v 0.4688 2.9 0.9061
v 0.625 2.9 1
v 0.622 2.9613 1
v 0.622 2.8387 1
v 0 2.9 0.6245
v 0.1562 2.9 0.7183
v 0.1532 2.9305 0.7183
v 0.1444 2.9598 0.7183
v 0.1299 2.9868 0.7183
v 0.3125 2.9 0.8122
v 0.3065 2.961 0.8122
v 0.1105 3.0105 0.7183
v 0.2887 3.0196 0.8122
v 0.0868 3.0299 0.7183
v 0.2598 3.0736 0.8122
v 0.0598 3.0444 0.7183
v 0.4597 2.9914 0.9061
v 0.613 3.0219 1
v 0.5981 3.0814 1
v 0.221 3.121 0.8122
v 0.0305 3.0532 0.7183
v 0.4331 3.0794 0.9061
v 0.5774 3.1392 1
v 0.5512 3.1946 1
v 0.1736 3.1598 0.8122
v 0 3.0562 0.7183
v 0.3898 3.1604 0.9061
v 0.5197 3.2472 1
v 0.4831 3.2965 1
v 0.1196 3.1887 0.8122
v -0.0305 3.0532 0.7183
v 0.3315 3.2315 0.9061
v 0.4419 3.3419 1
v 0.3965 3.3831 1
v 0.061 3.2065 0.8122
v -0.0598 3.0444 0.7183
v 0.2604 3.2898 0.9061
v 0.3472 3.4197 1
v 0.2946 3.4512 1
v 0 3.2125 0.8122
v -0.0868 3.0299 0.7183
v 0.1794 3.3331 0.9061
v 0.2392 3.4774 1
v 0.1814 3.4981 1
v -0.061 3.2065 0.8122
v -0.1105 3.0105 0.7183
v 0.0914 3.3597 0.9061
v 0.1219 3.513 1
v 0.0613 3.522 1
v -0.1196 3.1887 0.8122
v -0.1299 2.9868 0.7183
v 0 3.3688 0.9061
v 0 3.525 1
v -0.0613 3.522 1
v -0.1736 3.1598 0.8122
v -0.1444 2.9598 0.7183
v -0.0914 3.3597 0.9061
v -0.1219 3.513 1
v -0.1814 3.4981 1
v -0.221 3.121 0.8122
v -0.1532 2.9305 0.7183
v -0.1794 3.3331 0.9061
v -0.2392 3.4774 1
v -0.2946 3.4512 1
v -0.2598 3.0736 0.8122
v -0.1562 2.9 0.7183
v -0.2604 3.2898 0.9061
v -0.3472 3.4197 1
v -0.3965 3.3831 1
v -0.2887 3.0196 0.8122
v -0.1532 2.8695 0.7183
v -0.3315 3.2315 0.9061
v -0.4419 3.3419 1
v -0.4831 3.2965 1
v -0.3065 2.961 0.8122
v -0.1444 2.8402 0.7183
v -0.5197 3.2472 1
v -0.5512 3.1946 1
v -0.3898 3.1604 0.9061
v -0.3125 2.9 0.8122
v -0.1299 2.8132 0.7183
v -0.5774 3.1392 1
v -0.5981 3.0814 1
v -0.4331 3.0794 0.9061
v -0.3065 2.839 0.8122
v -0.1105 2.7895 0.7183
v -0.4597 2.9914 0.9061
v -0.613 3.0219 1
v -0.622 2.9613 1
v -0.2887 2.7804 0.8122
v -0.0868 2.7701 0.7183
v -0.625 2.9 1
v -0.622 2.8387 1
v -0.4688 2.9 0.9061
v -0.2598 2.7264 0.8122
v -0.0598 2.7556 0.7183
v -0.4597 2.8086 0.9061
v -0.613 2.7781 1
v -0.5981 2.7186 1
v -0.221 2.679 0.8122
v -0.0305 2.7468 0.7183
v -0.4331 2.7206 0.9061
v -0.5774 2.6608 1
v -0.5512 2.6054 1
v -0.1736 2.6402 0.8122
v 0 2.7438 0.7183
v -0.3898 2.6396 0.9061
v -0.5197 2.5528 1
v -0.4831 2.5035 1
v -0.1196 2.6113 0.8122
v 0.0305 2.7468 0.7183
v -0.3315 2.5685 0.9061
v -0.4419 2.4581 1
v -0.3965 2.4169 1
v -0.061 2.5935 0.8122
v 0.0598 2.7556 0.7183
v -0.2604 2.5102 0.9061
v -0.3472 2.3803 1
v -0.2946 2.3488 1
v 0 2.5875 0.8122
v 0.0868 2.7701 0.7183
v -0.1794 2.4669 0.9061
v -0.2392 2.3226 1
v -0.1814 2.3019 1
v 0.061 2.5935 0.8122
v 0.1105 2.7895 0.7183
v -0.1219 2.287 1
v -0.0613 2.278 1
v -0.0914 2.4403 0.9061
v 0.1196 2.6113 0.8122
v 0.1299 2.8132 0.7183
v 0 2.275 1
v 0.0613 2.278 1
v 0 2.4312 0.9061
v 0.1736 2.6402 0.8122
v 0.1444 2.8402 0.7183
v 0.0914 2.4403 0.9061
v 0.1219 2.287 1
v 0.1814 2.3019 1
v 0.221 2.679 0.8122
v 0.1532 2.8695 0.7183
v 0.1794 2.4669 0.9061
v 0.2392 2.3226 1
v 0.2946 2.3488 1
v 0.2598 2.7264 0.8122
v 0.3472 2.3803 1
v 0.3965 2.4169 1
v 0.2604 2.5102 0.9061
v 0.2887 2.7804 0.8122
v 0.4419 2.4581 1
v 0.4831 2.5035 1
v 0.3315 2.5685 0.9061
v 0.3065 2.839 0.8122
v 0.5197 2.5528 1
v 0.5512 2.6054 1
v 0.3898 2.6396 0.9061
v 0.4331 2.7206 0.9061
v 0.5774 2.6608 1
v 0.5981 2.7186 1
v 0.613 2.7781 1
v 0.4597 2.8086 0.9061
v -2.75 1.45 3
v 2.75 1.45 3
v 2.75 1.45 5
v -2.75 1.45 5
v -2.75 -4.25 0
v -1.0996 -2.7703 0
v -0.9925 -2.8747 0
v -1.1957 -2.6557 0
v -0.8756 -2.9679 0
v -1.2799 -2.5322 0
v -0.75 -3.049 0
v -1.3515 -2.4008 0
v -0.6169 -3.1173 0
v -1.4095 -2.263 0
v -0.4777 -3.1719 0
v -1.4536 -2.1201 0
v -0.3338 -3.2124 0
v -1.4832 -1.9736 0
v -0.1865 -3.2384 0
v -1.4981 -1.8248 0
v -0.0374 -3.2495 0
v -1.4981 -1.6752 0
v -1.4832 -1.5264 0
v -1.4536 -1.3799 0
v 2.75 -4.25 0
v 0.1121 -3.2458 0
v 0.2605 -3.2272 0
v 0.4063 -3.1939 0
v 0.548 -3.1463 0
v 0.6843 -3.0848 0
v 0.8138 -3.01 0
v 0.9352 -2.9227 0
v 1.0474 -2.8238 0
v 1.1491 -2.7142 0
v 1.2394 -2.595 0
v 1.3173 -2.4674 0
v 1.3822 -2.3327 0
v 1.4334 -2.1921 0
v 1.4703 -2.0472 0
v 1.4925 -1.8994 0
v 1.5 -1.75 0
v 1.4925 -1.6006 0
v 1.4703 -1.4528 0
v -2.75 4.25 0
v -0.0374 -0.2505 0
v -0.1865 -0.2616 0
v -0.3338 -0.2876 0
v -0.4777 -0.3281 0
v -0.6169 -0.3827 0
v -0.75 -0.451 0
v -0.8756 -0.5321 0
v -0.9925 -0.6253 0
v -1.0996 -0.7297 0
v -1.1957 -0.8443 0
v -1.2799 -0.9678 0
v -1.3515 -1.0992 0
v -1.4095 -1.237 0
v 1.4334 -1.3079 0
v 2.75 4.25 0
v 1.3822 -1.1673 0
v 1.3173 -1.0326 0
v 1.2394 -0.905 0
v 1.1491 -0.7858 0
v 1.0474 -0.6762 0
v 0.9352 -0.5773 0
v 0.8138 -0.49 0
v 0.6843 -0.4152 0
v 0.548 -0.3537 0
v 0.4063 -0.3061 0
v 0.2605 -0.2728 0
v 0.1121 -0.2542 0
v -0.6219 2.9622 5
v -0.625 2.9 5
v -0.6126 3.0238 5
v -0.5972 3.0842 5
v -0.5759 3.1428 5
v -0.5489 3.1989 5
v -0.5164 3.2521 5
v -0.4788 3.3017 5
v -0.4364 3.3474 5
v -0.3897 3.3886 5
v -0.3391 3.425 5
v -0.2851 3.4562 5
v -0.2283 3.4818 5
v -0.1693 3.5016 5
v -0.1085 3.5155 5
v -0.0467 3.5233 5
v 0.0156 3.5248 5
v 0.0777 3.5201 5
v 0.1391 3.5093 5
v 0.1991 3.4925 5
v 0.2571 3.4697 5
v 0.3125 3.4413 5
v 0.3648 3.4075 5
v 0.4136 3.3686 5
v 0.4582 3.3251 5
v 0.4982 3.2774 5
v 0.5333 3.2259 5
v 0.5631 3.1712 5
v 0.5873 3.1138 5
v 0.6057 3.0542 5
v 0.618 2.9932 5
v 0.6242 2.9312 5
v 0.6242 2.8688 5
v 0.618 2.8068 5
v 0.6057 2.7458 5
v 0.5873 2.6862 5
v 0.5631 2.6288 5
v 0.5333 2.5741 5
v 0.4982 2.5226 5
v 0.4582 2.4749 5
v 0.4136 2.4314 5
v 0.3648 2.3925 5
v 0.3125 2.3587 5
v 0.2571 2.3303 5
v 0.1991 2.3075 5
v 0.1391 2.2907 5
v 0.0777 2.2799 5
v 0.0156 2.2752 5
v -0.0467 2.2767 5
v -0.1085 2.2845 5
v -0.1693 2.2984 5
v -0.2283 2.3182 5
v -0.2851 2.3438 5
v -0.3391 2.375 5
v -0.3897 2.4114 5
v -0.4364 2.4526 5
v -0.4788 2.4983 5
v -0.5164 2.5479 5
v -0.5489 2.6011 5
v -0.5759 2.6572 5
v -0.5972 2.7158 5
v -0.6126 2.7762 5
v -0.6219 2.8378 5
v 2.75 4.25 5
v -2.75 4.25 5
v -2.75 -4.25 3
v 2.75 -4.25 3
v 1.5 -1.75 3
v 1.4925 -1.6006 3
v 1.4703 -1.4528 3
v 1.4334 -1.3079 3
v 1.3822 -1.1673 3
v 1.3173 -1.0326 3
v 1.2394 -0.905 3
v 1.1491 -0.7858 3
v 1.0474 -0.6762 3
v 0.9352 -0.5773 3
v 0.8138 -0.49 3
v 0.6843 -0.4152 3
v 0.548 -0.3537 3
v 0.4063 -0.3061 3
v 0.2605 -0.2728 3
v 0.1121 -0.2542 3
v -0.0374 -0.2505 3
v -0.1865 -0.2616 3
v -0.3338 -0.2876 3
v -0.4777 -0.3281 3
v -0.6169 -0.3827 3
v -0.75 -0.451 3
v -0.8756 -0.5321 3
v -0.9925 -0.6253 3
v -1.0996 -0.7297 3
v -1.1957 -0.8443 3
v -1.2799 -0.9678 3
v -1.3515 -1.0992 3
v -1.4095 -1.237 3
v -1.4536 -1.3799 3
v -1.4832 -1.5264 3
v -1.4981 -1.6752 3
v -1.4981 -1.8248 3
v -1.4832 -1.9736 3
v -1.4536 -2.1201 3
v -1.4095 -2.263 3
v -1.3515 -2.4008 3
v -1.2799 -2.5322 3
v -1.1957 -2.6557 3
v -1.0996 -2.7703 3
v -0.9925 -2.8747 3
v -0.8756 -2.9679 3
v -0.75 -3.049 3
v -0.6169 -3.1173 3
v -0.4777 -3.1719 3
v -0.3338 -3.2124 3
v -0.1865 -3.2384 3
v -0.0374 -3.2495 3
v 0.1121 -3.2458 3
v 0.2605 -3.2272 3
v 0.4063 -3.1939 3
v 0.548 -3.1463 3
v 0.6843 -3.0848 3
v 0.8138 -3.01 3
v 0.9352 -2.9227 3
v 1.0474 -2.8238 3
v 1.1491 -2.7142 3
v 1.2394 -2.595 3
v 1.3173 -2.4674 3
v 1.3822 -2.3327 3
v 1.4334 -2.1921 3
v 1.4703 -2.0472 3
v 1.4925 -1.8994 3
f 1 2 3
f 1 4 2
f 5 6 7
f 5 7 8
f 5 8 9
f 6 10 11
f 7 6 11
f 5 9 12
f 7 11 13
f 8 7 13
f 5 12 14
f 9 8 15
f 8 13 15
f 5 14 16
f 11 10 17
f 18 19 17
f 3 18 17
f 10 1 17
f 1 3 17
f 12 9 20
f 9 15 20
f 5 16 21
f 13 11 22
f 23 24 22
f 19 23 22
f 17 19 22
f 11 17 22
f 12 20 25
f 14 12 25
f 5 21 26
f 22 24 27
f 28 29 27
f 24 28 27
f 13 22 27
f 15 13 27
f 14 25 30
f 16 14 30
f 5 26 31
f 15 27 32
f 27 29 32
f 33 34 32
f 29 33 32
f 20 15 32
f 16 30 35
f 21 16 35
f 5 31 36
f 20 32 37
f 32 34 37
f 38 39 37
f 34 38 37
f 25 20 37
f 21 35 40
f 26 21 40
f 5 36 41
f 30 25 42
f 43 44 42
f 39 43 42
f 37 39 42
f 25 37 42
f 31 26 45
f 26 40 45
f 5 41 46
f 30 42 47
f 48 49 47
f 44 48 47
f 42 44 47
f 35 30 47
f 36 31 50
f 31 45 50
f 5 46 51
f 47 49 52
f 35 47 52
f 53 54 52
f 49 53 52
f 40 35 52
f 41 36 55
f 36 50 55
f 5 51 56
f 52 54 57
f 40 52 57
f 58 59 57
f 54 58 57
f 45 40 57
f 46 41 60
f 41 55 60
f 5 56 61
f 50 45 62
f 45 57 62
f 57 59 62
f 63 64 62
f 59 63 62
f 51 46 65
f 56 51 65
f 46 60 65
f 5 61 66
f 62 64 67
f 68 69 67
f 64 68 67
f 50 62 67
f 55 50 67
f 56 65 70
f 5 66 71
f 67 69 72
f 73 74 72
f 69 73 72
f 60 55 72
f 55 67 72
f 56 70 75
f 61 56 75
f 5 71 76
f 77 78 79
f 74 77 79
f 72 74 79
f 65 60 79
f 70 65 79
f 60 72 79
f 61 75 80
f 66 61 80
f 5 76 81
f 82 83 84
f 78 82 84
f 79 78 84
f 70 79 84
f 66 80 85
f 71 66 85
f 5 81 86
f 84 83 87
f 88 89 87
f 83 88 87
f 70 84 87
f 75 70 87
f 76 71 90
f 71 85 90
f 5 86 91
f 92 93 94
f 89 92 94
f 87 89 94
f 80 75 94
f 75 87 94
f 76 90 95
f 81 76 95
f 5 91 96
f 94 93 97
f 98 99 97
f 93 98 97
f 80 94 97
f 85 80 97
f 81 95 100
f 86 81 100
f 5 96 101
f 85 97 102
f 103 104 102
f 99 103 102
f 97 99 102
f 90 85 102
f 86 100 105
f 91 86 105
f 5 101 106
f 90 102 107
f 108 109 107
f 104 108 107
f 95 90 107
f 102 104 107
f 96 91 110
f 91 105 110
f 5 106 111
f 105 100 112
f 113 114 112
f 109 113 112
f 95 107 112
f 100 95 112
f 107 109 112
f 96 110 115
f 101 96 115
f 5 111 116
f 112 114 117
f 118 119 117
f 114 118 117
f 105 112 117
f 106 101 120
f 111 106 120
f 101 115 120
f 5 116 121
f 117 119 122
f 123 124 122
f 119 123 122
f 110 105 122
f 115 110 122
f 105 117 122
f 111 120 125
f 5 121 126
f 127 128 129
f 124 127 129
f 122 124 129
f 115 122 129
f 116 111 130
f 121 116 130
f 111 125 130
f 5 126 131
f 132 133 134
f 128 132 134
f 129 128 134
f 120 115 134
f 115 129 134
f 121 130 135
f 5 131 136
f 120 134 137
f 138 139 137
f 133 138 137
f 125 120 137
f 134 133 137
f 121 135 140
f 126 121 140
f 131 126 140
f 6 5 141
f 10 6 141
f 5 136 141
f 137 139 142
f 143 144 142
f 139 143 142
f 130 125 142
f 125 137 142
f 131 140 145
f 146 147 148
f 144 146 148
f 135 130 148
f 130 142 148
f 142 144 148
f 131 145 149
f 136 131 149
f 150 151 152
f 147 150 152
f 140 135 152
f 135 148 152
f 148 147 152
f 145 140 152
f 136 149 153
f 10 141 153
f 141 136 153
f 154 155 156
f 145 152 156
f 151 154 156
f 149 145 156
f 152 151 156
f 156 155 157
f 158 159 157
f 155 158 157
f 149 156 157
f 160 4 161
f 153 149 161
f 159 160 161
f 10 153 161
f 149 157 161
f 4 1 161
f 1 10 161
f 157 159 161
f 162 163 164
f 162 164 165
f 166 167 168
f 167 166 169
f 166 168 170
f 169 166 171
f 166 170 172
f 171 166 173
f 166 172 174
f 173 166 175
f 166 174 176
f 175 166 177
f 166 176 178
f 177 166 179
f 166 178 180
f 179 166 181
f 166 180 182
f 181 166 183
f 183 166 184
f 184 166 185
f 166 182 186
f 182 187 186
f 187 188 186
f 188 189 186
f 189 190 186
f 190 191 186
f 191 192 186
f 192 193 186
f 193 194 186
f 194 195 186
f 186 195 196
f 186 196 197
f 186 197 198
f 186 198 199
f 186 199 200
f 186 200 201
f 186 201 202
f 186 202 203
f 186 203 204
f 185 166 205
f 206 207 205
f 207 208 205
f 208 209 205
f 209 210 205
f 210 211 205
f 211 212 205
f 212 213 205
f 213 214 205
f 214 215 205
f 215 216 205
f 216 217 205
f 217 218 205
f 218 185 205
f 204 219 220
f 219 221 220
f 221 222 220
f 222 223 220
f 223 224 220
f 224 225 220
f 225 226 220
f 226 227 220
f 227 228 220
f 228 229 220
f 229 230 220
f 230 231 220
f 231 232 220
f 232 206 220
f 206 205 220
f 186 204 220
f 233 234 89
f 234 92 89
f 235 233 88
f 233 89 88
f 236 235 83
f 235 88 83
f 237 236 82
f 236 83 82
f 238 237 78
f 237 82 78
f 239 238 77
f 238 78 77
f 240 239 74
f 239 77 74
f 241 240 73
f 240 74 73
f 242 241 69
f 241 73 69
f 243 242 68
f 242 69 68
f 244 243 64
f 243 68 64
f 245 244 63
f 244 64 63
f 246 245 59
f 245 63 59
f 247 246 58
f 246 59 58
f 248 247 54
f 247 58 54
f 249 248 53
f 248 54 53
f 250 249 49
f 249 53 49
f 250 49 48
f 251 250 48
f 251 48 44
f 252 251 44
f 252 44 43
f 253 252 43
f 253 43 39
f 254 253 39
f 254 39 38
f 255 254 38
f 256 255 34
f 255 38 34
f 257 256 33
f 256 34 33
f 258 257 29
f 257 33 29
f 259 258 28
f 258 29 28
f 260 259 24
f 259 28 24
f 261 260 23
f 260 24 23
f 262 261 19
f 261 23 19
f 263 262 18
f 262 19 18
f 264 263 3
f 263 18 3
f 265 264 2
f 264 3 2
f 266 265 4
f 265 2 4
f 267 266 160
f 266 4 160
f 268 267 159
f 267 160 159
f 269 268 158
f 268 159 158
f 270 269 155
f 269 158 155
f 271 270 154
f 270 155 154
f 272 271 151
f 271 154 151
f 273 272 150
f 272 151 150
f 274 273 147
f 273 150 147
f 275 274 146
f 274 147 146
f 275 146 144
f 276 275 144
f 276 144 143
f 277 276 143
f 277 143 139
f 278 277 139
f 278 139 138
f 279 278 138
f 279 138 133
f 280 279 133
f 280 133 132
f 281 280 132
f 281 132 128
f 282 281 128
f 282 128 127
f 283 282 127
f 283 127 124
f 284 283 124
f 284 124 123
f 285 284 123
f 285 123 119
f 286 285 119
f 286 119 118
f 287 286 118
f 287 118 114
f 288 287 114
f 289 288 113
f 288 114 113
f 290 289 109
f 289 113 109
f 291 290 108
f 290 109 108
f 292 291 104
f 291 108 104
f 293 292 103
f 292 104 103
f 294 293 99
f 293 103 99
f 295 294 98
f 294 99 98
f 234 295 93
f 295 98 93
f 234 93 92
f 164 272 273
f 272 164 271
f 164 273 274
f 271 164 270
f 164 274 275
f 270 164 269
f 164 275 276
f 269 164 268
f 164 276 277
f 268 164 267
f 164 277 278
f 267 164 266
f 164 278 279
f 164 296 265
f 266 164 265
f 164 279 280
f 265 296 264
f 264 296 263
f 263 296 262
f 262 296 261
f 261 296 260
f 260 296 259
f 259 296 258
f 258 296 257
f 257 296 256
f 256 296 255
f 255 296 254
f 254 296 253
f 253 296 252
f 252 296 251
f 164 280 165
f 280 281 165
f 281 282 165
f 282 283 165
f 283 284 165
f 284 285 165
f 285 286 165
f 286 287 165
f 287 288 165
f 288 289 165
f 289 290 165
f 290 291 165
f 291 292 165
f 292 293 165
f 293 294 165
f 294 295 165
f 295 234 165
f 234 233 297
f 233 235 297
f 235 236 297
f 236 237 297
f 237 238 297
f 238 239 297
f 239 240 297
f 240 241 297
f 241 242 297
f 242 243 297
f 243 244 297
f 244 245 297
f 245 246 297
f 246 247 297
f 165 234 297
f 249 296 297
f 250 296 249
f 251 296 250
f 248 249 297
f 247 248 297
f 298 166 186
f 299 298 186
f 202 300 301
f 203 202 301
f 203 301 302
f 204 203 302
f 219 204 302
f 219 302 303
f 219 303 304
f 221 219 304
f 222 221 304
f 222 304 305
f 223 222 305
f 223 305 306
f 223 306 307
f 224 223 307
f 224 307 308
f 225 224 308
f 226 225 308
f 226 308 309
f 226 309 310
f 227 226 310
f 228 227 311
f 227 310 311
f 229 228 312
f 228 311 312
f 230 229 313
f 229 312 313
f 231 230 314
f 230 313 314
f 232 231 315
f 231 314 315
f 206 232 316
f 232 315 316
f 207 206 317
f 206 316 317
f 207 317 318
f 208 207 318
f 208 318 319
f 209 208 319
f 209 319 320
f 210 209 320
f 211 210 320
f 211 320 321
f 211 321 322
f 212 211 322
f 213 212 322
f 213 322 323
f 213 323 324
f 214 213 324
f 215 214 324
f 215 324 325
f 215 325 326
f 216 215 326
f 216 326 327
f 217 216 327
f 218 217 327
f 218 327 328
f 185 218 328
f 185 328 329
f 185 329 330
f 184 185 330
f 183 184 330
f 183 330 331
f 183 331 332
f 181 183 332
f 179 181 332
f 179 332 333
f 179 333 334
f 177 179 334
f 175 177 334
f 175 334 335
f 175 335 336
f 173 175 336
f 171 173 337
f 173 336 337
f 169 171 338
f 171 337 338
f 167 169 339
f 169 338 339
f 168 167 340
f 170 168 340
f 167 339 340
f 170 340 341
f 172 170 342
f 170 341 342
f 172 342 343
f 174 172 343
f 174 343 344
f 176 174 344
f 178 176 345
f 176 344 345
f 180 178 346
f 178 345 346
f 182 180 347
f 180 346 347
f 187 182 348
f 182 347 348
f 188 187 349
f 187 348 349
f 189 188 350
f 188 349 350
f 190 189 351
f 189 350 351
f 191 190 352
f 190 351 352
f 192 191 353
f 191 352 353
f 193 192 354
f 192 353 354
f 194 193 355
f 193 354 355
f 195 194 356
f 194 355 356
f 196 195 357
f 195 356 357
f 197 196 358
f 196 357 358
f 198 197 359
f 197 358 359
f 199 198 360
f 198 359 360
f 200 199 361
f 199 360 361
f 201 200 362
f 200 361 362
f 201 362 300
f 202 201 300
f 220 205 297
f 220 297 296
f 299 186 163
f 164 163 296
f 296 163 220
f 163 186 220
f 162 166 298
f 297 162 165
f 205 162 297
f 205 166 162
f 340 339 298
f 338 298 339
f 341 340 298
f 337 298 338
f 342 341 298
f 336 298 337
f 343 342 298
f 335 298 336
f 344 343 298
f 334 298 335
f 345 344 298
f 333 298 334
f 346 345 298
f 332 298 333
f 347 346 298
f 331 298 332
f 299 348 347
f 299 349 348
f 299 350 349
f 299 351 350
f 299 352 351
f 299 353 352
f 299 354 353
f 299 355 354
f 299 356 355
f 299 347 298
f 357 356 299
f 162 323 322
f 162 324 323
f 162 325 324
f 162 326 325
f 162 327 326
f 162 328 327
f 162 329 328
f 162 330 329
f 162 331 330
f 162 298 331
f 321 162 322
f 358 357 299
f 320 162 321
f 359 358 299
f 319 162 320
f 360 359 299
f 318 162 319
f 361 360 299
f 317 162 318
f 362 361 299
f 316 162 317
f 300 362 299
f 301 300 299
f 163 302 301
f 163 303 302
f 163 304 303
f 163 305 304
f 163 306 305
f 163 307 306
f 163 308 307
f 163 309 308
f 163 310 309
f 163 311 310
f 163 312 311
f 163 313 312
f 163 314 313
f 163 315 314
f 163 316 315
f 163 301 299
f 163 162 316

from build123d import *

# Parameters (mm, degrees)
SKETCH1_W                    = 5.5
SKETCH1_H                    = 8.5
BOSS_EXTRUDE1_DEPTH          = 3
SKETCH4_R                    = 1.5
CUT_EXTRUDE1_DEPTH           = 10
SKETCH7_W                    = 5.5
SKETCH7_H                    = 2.8
BOSS_EXTRUDE2_DEPTH          = 5
M1_6X0_35_TAPPED_HOLE1_D     = 1.25
M1_6X0_35_TAPPED_HOLE1_DEPTH = 4
M1_6X0_35_TAPPED_HOLE1_TIP   = 0.375537887


with BuildPart() as part:
    # Sketch1 → Boss-Extrude1 (new body)
    with BuildSketch(Plane.XY):
        Rectangle(SKETCH1_W, SKETCH1_H)
    extrude(amount=BOSS_EXTRUDE1_DEPTH)

    # Sketch4 → Cut-Extrude1 (cut)
    with BuildSketch(Plane.XY.offset(3)):
        with Locations((0, -1.75)):
            Circle(SKETCH4_R)
    extrude(amount=-CUT_EXTRUDE1_DEPTH, mode=Mode.SUBTRACT)

    # Sketch7 → Boss-Extrude2 (add)
    with BuildSketch(Plane(origin=(0, 0, 0), x_dir=(-1, 0, 0), z_dir=(0, 0, -1))):
        with Locations((0, 2.85)):
            Rectangle(SKETCH7_W, SKETCH7_H)
    extrude(amount=-BOSS_EXTRUDE2_DEPTH)

    # M1.6x0.35 Tapped Hole1
    with Locations(Plane.XY.offset(5)):
        with Locations((0, 2.9)):
            Hole(M1_6X0_35_TAPPED_HOLE1_D / 2, depth=M1_6X0_35_TAPPED_HOLE1_DEPTH)
            with Locations((0, 0, -(M1_6X0_35_TAPPED_HOLE1_DEPTH + M1_6X0_35_TAPPED_HOLE1_TIP / 2))):  # 118° drill point
                Cone(0, M1_6X0_35_TAPPED_HOLE1_D / 2, M1_6X0_35_TAPPED_HOLE1_TIP, mode=Mode.SUBTRACT)


solid = part.part
